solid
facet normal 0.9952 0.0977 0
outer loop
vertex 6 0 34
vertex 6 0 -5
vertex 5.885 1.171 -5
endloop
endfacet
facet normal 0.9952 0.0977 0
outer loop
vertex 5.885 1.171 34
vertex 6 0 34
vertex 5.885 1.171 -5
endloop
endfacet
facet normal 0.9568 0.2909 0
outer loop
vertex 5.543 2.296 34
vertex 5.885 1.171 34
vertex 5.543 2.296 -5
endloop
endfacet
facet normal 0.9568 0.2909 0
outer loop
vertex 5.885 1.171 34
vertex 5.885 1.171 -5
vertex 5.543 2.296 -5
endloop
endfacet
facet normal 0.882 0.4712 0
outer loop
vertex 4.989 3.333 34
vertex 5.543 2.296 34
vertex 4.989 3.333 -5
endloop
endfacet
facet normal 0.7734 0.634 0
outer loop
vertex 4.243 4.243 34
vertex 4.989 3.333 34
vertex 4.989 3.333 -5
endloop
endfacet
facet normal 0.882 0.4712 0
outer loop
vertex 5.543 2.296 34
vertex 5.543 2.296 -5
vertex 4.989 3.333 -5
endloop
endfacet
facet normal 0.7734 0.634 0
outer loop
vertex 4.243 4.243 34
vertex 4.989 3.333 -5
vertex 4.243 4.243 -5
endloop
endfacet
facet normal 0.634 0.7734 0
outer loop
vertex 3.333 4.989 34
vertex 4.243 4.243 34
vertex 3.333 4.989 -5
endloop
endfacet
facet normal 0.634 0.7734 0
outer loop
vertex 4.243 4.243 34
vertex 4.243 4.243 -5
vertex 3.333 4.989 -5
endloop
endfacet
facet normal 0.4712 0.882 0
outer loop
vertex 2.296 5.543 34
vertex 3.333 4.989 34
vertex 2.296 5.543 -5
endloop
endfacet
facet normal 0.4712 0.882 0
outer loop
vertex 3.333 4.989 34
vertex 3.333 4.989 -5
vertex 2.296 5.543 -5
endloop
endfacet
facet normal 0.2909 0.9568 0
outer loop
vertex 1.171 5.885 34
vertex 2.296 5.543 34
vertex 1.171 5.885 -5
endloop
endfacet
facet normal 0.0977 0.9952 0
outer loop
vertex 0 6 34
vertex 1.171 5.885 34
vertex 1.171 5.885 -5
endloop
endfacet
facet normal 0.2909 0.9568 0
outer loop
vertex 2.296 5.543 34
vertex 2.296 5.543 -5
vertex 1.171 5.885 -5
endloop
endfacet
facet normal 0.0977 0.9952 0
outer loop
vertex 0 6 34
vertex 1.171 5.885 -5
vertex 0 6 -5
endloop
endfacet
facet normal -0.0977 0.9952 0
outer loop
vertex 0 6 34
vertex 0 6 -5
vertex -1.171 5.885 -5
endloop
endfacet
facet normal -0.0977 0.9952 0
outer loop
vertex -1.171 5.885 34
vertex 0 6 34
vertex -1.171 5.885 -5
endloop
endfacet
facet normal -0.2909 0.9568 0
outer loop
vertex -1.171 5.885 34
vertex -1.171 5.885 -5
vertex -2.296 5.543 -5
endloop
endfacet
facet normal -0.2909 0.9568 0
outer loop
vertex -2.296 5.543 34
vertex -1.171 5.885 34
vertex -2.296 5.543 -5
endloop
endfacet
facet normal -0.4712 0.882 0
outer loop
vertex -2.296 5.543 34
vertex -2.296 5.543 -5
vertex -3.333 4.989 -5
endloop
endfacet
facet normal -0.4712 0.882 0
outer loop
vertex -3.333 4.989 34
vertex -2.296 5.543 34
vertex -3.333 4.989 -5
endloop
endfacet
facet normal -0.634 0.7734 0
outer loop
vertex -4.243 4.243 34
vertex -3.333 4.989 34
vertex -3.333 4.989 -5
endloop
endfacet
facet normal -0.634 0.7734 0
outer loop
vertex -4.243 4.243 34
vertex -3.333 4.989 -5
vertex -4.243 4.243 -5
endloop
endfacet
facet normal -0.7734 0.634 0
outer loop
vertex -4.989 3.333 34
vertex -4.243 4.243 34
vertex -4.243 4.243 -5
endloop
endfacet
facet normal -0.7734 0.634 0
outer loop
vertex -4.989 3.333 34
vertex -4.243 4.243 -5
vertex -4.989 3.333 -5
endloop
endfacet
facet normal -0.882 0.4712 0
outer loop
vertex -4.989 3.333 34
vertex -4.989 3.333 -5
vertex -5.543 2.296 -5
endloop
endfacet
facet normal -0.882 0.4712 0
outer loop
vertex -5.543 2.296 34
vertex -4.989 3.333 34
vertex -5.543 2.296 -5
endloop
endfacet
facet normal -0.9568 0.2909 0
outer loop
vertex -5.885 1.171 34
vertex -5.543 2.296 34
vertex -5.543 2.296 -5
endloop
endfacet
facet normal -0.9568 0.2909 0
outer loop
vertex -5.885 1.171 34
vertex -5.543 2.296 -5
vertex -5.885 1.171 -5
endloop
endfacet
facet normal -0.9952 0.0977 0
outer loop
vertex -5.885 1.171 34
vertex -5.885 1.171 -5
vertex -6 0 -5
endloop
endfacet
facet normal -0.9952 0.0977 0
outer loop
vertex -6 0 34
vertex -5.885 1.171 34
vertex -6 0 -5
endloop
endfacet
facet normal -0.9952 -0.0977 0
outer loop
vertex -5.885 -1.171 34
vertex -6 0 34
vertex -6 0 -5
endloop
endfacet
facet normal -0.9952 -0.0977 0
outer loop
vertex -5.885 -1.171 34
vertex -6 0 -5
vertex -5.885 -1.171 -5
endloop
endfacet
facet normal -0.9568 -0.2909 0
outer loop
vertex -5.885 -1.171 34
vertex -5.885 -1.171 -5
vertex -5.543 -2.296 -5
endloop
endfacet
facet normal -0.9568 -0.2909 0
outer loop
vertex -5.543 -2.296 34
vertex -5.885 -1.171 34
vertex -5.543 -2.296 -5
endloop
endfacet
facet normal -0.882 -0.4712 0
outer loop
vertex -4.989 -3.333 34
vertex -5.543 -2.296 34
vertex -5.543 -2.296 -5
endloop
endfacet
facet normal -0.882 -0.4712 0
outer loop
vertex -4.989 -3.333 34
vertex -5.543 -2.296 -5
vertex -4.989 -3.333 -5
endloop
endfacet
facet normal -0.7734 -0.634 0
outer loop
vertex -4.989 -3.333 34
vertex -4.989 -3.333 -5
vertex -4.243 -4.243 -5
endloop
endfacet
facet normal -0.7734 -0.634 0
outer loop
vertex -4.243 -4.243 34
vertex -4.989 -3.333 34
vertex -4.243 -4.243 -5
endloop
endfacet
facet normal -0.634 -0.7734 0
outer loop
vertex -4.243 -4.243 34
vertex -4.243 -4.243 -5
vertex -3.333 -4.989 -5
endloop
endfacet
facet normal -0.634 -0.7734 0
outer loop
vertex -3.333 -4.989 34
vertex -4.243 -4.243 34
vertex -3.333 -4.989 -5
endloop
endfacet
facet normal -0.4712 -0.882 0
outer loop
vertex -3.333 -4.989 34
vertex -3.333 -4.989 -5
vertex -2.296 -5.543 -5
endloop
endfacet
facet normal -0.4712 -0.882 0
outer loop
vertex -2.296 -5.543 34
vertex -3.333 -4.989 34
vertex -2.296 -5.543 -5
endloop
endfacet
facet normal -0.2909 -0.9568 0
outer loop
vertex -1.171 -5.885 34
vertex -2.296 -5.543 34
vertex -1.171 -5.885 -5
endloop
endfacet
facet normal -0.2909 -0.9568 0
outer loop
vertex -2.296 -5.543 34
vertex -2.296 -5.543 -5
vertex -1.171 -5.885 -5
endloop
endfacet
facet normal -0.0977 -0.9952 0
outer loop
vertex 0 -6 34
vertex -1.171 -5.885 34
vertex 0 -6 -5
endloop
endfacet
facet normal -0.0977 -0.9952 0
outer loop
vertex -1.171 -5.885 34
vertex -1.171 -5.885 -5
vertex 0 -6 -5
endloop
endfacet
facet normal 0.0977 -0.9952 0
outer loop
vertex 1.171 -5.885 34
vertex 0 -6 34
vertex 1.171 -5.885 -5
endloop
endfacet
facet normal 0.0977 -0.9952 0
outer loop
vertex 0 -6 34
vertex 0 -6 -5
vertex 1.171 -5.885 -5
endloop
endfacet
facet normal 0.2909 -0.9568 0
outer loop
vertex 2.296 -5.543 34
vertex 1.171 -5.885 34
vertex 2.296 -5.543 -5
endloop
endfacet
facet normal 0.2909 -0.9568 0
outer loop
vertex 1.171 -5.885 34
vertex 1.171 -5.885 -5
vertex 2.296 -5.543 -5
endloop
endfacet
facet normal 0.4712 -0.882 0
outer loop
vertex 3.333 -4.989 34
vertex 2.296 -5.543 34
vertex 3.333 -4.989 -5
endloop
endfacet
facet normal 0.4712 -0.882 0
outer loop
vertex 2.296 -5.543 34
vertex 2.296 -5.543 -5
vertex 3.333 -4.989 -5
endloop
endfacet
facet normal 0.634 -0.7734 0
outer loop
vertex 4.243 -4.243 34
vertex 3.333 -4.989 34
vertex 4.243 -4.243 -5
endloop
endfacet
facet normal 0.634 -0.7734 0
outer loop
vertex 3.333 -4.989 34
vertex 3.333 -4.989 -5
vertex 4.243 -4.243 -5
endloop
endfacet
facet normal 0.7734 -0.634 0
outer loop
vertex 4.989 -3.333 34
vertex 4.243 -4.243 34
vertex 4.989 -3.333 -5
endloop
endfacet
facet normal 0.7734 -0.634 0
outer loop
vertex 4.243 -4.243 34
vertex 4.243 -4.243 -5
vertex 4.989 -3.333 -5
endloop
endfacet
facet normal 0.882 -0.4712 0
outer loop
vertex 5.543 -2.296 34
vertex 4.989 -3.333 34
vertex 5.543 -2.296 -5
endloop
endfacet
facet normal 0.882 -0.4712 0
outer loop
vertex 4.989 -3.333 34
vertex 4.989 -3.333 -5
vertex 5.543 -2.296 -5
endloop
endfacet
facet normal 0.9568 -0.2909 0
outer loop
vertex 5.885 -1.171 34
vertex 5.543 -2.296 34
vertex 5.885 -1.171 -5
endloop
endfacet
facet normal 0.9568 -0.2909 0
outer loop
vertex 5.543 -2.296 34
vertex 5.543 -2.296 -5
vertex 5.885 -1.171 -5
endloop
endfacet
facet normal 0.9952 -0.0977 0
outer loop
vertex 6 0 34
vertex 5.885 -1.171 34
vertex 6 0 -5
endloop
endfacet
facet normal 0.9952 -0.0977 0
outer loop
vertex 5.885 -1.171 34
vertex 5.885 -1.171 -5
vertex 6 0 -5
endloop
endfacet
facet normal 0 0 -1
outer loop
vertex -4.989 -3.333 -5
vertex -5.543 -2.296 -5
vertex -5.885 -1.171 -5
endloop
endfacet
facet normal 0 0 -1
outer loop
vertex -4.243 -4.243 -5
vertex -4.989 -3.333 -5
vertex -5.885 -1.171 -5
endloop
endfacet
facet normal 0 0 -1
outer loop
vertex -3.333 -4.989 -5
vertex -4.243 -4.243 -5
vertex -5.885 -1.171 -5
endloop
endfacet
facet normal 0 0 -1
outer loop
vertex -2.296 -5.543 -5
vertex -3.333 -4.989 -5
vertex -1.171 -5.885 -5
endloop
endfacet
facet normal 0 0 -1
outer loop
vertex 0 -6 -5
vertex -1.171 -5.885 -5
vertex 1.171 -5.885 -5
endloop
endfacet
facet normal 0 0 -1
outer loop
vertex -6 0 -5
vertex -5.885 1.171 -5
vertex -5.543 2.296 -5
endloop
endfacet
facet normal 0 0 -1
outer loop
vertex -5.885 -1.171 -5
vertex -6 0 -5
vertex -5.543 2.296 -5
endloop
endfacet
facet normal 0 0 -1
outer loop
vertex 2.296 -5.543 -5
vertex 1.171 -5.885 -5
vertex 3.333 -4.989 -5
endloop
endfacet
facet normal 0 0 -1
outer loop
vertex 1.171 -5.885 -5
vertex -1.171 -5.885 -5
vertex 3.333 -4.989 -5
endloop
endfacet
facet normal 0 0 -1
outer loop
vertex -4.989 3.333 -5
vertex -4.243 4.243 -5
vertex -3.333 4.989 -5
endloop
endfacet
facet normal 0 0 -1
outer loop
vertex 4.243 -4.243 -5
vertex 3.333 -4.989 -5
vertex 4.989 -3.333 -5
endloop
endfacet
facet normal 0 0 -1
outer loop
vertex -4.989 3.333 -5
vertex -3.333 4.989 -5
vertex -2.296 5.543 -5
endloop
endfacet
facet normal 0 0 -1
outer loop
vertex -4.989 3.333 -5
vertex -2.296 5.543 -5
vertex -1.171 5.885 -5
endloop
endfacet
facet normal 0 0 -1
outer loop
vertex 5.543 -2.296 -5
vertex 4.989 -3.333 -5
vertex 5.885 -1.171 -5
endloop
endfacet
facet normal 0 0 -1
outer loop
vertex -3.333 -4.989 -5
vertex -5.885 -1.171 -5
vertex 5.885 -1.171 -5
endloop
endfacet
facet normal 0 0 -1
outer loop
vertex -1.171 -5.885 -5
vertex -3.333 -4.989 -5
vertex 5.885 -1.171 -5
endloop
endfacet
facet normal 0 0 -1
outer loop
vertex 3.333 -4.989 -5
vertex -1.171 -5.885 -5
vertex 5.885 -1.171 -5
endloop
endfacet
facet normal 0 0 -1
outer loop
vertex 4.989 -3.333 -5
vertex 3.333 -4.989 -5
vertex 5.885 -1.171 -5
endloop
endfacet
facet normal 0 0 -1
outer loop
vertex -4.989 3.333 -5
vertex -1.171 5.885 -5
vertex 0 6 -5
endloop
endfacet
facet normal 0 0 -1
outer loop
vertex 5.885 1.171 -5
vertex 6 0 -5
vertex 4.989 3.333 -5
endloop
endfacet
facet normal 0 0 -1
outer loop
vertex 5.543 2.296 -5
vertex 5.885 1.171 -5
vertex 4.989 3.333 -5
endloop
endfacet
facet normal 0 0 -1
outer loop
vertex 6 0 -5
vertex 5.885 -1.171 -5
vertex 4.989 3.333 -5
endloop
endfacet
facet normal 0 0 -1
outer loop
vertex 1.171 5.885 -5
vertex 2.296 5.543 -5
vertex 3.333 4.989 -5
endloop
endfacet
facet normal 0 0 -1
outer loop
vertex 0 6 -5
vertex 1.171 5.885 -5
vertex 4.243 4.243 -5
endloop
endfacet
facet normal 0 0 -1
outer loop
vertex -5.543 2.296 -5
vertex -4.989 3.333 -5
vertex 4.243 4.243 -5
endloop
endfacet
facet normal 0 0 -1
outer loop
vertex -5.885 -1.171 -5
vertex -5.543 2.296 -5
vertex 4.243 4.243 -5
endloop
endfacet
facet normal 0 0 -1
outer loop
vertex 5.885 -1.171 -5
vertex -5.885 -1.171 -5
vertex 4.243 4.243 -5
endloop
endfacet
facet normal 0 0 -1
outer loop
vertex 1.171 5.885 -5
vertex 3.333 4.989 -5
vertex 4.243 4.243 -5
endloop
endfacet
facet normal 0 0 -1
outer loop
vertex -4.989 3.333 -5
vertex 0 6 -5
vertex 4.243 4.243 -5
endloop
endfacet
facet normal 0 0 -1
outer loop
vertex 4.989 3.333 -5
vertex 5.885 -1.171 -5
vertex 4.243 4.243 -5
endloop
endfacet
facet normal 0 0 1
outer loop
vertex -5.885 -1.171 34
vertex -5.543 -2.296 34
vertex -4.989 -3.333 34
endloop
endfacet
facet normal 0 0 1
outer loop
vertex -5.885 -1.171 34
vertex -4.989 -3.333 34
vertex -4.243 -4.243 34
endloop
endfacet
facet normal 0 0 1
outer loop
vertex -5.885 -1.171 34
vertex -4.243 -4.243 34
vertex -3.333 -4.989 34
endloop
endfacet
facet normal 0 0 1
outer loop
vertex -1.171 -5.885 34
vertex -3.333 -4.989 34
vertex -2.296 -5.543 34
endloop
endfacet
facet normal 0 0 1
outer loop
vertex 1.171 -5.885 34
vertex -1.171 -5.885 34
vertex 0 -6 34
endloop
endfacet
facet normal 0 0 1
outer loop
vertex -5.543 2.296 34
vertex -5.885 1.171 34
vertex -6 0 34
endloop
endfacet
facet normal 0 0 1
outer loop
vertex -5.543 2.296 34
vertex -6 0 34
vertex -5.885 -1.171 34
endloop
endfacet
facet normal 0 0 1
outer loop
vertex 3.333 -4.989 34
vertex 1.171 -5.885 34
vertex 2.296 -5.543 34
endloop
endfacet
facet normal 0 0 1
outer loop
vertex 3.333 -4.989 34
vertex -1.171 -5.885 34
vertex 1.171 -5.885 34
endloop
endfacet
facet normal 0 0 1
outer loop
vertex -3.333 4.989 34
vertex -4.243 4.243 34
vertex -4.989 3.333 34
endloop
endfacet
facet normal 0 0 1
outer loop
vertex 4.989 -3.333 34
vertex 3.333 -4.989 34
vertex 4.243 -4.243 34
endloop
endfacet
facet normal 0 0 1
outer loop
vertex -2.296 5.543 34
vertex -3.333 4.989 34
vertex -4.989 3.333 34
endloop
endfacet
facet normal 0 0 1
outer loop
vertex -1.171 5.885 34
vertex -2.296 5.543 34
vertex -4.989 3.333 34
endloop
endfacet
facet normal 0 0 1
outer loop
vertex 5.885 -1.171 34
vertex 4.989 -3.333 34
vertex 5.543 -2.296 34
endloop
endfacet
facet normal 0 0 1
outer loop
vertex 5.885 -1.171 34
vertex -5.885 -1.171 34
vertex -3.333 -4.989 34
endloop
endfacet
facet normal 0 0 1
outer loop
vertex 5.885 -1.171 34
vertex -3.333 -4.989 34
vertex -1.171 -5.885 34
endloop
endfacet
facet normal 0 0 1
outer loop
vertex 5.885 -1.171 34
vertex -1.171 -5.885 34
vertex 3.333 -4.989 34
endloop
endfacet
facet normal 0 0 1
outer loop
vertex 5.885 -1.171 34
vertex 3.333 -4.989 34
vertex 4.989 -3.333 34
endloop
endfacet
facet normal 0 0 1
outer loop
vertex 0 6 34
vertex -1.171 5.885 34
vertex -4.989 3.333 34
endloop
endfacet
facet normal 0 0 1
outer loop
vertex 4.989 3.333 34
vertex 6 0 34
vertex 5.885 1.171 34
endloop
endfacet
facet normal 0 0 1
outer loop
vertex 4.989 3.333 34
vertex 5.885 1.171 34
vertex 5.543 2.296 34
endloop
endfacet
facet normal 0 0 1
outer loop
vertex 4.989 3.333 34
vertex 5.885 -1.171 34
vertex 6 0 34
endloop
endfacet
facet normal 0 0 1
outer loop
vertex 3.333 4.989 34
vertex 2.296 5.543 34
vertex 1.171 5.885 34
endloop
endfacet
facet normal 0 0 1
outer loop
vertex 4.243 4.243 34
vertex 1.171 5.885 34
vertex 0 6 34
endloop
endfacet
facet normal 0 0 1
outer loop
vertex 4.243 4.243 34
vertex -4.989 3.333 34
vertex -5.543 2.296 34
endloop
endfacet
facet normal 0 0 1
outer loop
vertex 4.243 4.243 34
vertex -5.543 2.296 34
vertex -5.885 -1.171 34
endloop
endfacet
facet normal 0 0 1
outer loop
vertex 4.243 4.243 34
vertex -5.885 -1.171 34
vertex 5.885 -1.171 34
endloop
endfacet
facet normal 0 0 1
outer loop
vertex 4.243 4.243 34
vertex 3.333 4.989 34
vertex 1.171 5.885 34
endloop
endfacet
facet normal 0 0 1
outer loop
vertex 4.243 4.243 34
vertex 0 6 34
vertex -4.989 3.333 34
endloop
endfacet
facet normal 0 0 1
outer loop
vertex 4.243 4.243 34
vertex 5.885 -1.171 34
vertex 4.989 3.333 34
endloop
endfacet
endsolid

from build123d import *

# Parameters (mm, degrees)
CYLINDER003_R     = 6
CYLINDER003_DEPTH = 25
CYLINDER002_R     = 6
CYLINDER002_DEPTH = 9
CYLINDER_R        = 6
CYLINDER_DEPTH    = 5


with BuildPart() as cylinder003:
    # Cylinder003 → Cylinder003 (new body)
    with BuildSketch(Plane.XY.offset(9)):
        Circle(CYLINDER003_R)
    extrude(amount=CYLINDER003_DEPTH)


with BuildPart() as cylinder002:
    # Cylinder002 → Cylinder002 (new body)
    with BuildSketch(Plane.XY):
        Circle(CYLINDER002_R)
    extrude(amount=CYLINDER002_DEPTH)


with BuildPart() as fusion:
    # Cylinder → Cylinder (new body)
    with BuildSketch(Plane.XY.offset(-5)):
        Circle(CYLINDER_R)
    extrude(amount=CYLINDER_DEPTH)

    # Fusion: union Cylinder003, Cylinder002
    add(cylinder003.part)
    add(cylinder002.part)


solid = fusion.part
